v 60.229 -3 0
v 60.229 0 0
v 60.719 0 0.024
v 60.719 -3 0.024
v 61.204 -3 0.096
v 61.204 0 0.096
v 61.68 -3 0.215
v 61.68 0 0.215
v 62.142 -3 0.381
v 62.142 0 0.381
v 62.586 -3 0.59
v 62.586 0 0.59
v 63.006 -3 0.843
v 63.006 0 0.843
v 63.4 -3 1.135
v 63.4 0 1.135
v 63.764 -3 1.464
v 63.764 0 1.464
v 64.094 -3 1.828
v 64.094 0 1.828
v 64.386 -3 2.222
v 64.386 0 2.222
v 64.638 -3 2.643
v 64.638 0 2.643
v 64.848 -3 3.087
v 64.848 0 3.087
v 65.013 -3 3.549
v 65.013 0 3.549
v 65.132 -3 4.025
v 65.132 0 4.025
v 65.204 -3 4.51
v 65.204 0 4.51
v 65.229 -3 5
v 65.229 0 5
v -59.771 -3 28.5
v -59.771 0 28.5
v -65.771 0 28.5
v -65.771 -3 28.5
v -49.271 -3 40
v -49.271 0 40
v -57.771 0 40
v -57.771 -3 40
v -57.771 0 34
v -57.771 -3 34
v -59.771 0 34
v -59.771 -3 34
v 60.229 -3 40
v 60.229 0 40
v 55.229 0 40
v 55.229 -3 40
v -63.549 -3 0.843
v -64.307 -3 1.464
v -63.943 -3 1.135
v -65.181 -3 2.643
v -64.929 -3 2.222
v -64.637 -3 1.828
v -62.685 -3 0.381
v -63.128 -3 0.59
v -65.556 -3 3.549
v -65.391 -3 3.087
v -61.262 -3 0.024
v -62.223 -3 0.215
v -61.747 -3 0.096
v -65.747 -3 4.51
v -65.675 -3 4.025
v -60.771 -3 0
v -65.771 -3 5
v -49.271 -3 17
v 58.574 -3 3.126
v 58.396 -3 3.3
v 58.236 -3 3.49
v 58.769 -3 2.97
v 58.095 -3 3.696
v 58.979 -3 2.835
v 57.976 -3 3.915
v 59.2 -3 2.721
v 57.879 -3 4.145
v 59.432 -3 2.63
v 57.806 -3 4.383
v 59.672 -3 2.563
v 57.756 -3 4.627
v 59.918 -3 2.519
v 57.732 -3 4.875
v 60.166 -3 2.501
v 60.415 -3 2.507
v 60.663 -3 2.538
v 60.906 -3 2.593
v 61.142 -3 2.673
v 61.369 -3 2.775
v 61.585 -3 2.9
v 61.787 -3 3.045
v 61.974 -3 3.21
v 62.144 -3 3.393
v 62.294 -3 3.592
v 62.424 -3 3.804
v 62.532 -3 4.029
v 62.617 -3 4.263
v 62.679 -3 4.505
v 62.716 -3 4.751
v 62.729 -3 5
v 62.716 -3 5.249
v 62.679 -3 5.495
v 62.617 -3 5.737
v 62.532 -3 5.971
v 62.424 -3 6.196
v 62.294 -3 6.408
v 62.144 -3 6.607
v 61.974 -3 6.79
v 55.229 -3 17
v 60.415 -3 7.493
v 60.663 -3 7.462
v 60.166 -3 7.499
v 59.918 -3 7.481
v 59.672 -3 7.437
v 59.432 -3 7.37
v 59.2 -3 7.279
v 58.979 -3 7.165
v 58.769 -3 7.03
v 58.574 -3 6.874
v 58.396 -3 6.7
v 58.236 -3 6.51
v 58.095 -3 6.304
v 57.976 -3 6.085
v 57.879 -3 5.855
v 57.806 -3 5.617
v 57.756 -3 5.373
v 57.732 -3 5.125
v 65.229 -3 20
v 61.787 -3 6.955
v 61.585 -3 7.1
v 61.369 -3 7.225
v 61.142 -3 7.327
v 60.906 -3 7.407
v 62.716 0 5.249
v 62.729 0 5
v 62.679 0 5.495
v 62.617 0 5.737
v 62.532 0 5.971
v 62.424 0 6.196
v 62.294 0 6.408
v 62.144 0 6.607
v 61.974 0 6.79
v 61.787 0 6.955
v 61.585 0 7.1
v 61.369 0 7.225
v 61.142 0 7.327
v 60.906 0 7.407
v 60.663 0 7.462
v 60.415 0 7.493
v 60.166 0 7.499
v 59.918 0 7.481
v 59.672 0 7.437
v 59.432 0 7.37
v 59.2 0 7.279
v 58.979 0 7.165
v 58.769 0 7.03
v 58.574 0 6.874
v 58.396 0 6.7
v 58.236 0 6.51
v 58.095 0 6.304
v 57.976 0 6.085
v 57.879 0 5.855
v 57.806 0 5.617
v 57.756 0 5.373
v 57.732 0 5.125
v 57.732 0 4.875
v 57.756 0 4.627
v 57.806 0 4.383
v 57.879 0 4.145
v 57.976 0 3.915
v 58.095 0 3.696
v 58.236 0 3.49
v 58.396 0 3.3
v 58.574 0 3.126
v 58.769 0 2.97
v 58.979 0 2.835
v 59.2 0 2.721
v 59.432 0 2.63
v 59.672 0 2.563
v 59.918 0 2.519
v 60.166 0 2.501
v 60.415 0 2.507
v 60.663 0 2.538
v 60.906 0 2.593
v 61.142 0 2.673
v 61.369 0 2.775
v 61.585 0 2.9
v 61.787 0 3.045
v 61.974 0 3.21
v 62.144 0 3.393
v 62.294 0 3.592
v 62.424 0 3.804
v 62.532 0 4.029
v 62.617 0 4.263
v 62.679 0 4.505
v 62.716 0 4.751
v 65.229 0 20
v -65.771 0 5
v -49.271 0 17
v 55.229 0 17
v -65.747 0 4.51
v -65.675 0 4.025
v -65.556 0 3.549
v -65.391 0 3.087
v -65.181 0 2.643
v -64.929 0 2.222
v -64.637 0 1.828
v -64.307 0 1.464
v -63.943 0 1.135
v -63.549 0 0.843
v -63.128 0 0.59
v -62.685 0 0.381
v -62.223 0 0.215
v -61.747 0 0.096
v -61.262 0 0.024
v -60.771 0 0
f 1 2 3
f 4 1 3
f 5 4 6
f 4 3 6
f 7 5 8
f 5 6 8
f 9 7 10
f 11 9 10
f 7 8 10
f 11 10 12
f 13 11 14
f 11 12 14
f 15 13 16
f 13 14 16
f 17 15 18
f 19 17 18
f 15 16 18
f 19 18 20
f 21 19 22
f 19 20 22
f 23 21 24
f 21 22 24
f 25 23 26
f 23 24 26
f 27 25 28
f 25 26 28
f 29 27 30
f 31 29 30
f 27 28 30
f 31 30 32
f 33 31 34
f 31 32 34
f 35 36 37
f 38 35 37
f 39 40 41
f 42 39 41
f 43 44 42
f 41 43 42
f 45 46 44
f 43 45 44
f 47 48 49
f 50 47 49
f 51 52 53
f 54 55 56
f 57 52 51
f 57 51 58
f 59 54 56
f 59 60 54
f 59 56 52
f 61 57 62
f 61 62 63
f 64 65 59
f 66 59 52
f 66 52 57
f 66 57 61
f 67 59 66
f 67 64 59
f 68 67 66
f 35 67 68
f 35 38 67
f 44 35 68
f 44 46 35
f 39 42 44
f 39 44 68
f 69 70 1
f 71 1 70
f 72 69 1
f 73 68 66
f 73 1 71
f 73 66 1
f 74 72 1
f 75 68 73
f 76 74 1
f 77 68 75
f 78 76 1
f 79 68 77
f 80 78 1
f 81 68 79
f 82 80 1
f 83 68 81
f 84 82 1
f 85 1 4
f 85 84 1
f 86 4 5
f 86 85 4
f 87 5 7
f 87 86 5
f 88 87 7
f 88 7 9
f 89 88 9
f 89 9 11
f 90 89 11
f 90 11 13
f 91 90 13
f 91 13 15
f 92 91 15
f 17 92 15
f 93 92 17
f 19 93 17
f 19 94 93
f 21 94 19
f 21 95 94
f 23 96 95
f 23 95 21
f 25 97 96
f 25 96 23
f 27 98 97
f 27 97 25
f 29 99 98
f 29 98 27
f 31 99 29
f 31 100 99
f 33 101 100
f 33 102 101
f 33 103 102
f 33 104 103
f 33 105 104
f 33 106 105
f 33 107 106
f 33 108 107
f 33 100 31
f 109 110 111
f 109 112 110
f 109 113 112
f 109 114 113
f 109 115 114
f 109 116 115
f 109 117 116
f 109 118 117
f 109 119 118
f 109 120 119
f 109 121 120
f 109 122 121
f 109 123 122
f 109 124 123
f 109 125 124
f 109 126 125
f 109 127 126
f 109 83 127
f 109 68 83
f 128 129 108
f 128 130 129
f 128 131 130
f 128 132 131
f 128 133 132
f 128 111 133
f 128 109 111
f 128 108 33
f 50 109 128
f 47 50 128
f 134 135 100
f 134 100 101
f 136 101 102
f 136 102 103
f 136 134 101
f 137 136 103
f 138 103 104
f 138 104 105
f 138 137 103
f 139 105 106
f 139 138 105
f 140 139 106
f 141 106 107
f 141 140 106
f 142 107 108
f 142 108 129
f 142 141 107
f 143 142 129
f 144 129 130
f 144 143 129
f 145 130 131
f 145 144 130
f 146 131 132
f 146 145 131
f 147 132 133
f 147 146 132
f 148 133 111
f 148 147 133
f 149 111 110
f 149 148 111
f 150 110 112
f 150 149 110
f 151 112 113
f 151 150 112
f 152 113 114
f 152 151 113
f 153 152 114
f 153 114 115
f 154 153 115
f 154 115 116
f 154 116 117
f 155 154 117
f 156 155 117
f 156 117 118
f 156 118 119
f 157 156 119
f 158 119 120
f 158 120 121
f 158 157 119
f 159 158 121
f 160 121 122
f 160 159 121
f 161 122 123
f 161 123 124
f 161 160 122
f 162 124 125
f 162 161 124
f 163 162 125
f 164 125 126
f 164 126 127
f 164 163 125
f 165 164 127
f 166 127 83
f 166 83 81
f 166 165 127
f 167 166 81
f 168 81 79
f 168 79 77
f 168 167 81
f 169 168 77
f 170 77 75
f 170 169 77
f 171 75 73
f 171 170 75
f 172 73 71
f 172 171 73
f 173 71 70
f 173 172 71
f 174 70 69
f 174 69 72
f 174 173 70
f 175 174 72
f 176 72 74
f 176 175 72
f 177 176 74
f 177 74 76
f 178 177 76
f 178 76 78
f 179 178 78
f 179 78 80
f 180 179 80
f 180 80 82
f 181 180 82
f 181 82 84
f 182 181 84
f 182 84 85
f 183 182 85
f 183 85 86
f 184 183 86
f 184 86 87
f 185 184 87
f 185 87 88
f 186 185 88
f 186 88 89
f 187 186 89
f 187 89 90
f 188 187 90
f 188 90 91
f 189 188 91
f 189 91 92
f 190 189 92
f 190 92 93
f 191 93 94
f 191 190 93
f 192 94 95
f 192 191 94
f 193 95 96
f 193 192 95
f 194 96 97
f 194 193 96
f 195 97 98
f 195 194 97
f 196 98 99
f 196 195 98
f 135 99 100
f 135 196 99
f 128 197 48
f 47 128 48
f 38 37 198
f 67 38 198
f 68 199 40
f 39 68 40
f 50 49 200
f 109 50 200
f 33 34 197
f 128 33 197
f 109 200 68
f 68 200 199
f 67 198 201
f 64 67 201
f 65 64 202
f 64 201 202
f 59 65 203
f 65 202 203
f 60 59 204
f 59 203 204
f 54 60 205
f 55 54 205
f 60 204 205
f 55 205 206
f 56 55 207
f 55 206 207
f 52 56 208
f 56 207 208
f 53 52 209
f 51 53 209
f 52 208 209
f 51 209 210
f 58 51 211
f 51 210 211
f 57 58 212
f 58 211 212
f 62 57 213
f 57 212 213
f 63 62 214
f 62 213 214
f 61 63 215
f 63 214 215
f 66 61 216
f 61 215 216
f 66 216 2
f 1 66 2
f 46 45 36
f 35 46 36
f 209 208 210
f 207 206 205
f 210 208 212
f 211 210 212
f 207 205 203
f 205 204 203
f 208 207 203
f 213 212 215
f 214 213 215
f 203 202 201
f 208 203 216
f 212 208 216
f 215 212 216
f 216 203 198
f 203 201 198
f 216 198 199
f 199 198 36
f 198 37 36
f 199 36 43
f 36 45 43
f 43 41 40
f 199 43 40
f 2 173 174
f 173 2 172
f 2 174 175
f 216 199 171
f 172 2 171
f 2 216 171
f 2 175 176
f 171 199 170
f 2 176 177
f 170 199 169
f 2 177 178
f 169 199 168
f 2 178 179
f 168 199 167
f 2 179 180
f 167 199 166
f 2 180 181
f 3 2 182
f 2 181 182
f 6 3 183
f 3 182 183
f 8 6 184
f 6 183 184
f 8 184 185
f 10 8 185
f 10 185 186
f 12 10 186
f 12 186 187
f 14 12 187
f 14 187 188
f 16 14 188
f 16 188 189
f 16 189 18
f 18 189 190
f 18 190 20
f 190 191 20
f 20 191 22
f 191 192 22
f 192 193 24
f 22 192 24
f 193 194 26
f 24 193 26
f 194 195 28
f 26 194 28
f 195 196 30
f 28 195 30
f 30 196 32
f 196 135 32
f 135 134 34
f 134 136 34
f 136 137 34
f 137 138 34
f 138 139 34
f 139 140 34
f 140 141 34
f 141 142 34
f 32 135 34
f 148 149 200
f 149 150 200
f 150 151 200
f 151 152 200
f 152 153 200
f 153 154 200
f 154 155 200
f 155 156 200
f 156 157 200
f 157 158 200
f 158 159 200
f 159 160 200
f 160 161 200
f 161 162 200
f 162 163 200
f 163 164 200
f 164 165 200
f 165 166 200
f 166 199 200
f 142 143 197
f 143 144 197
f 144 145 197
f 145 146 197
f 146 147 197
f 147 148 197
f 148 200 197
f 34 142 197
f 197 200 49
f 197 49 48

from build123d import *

# Parameters (mm, degrees)
F0_R     = 2.5
F1_DEPTH = 3
F2_W     = 2
F2_H     = 6
F3_DEPTH = 3.001


with BuildPart() as f1:
    # F0 (on Front) → F1 (new body)
    with BuildSketch(Plane.XZ):
        with BuildLine():
            Line((-59.771481, 28.5), (-65.771481, 28.5))
            Line((-65.771481, 28.5), (-65.771481, 5))
            ThreePointArc((-65.771481, 5), (-64.307015, 1.464466), (-60.771481, 0))
            Line((-60.771481, 0), (60.228519, 0))
            ThreePointArc((60.228519, 0), (63.764053, 1.464466), (65.228519, 5))
            Line((65.228519, 5), (65.228519, 20))
            Line((65.228519, 20), (60.228519, 40))
            Line((60.228519, 40), (55.228519, 40))
            Line((55.228519, 40), (55.228519, 17))
            Line((55.228519, 17), (-49.271481, 17))
            Line((-49.271481, 17), (-49.271481, 40))
            Line((-49.271481, 40), (-59.771481, 40))
            Line((-59.771481, 40), (-59.771481, 28.5))
        make_face()
        with Locations((60.228519, 5)):
            Circle(F0_R, mode=Mode.SUBTRACT)
    extrude(amount=F1_DEPTH)

    # F2 (on face) → F3 (cut, through all)
    with BuildSketch(Plane.XZ.offset(3)):
        with Locations((-58.771481, 37)):
            Rectangle(F2_W, F2_H)
    extrude(amount=-F3_DEPTH, mode=Mode.SUBTRACT)


solid = f1.part
